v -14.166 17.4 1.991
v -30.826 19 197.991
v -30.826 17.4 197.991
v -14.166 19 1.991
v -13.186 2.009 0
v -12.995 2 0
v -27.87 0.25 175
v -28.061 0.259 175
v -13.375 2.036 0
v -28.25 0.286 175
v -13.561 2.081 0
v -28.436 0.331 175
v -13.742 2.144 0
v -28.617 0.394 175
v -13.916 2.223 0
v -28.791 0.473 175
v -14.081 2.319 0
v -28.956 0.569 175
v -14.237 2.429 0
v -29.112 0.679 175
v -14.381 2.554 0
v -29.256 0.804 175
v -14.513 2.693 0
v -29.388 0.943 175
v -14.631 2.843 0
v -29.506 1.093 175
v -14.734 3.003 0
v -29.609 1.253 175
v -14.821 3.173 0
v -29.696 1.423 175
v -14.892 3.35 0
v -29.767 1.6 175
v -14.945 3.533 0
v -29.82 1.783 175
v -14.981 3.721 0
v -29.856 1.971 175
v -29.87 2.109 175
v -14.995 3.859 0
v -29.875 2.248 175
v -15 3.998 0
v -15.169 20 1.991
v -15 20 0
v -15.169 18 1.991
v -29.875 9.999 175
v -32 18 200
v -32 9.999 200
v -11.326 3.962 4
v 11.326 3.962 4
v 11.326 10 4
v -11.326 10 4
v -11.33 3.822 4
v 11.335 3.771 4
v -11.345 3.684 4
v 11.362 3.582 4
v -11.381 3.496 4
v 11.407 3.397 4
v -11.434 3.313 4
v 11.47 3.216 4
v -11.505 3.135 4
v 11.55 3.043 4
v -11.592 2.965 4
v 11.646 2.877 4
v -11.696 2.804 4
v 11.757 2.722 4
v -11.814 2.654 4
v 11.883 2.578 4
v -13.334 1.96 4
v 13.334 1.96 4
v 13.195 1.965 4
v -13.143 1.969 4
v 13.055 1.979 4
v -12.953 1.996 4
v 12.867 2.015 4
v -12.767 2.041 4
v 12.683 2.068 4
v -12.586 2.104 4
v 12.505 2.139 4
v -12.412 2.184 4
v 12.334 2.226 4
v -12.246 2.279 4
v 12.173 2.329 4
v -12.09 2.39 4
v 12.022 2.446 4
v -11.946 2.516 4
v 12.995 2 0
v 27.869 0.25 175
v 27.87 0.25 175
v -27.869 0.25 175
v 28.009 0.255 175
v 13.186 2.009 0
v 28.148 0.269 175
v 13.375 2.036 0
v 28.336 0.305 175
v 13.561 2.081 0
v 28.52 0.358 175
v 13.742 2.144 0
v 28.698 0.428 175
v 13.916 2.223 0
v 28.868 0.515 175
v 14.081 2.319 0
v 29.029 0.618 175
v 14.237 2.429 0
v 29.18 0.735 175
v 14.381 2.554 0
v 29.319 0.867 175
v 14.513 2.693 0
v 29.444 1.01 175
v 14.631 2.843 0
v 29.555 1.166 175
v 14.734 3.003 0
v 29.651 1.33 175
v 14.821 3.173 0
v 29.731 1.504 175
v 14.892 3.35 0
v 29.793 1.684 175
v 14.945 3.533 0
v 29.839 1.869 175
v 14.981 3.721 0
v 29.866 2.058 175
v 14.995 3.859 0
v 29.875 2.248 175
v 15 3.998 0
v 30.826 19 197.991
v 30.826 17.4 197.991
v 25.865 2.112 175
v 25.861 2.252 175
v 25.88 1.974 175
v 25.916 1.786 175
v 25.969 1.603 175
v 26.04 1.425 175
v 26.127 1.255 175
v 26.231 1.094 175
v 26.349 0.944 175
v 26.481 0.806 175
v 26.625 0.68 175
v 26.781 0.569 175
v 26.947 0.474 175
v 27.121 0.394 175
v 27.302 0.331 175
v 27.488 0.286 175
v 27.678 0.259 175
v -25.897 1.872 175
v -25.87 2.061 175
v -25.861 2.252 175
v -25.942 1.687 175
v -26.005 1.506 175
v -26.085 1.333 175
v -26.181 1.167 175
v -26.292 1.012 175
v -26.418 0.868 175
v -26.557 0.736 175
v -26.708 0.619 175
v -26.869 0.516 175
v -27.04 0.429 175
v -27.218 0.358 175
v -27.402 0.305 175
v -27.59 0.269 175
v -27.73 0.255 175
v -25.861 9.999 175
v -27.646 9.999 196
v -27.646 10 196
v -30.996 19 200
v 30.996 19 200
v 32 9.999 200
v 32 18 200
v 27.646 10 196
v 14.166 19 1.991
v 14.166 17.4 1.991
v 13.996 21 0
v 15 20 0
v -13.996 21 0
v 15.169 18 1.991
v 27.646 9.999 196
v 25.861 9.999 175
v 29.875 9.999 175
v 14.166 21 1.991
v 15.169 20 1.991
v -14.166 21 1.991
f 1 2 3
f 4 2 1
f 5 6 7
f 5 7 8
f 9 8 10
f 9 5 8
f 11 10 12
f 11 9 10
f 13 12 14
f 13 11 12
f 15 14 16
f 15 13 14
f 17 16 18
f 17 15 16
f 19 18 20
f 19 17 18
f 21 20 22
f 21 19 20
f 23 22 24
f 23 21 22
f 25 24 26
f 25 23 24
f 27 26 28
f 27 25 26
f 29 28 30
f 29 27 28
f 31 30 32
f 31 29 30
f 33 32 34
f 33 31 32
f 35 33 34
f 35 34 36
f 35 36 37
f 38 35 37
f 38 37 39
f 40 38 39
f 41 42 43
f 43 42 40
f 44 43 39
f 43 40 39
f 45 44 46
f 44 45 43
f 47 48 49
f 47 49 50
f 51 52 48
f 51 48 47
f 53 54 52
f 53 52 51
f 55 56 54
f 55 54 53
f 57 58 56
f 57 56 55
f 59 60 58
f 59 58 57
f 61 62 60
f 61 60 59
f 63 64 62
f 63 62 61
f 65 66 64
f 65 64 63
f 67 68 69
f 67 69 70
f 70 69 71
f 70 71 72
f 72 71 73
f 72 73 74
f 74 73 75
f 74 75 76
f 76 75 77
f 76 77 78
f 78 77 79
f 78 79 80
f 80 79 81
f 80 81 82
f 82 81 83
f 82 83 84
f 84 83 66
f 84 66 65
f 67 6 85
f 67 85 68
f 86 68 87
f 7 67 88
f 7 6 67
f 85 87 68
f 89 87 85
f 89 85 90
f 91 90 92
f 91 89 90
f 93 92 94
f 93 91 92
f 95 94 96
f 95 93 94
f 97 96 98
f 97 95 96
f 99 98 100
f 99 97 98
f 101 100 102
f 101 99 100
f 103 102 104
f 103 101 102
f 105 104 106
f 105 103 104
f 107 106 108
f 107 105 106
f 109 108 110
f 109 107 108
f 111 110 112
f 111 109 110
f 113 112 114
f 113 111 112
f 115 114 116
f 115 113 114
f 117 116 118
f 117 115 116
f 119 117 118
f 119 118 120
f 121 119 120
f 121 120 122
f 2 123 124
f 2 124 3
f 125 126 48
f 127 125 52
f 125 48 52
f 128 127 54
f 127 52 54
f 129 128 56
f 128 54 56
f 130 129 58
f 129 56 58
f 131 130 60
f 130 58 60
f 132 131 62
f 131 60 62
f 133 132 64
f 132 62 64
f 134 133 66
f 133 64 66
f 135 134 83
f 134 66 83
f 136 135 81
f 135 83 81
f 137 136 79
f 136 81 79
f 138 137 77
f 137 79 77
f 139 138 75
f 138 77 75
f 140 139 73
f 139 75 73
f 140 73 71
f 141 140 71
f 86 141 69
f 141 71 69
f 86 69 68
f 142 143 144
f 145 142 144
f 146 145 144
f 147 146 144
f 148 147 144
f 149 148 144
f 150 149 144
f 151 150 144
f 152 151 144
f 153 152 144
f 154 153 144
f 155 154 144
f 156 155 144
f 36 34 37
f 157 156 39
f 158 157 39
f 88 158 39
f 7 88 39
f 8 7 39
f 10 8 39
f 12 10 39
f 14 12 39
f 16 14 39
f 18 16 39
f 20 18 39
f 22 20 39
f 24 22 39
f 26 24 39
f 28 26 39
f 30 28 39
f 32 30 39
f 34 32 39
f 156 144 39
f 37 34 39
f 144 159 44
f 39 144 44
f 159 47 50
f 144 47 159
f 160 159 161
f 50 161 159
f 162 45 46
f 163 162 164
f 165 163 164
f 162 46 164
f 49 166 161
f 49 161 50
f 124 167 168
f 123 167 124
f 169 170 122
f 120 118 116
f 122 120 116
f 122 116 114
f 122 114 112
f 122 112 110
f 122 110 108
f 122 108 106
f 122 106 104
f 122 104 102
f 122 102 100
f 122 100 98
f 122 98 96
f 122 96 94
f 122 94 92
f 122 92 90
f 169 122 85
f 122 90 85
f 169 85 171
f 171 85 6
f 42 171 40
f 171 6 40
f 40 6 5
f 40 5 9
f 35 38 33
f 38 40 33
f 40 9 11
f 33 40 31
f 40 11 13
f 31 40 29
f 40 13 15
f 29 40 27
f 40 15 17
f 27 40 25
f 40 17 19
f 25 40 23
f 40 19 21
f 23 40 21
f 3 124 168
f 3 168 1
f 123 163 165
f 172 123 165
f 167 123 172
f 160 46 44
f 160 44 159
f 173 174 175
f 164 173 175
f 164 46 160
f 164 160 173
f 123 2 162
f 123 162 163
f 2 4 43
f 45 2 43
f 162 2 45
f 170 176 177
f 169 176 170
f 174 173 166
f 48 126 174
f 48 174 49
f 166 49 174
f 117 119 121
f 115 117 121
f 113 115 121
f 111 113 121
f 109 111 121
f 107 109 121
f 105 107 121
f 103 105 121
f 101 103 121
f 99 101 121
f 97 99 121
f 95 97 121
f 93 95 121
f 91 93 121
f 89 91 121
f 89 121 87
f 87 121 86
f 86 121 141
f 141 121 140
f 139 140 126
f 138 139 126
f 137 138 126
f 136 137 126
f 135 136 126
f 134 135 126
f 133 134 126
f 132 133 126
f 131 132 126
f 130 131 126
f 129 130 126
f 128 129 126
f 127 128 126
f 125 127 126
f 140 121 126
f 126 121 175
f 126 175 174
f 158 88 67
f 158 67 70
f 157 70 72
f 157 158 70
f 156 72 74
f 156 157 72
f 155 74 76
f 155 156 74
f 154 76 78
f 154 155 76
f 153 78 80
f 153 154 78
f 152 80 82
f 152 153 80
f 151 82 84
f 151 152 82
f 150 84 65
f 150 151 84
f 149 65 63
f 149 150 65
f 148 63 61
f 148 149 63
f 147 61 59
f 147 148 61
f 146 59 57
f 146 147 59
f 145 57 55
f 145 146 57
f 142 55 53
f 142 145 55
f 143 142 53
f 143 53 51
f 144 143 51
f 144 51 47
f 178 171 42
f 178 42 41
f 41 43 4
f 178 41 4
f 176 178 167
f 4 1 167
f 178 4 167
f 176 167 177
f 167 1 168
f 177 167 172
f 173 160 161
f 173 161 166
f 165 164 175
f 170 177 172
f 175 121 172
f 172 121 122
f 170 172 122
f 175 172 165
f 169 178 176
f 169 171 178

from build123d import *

# Parameters (mm, degrees)
BOSS_EXTRUDE1_DEPTH      = 19
CUT_EXTRUDE1_DEPTH       = 204.4330356653019
CUT_EXTRUDE1_DEPTH_BACK  = 204.4330356653019
SHELL1_T                 = -4
SHELL1_THICKNESS_2_DEPTH = 5
FILLET2_R                = 2
FILLET3_R                = 2
BOSS_EXTRUDE2_DEPTH      = 1.9999999999999862
CHAMFER1_SIZE            = 1
CHAMFER2_SIZE            = 1
CUT_EXTRUDE2_DEPTH       = 1.6
CUT_EXTRUDE3_DEPTH       = 25.000000000000007


with BuildPart() as part:
    # Sketch1 → Boss-Extrude1 (new body)
    with BuildSketch(Plane(origin=(0, 0, 0), x_dir=(1, 0, 0), z_dir=(0, 1, 0))):
        Polygon((15, 1.84e-15), (-15, -1.84e-15), (-31.99999999999997, -200), (32.00000000000003, -200), align=None)
    extrude(amount=BOSS_EXTRUDE1_DEPTH)

    # Sketch4 → Cut-Extrude1 (cut, two sides: drawn at the far end of the back side and taken through both)
    with BuildSketch(Plane(origin=(0, 0, 0), x_dir=(0, 0, -1), z_dir=(1, 0, 0)).offset(-CUT_EXTRUDE1_DEPTH_BACK)):
        Polygon((-200, 0), (0, 0), (1.59e-15, 2), align=None)
    extrude(amount=CUT_EXTRUDE1_DEPTH + CUT_EXTRUDE1_DEPTH_BACK, mode=Mode.SUBTRACT)

    # Shell1
    shell1_openings = [part.faces().sort_by_distance(p)[0] for p in [
        (0, 0.879432624, 112.056737589),
    ]]
    offset(amount=SHELL1_T, openings=shell1_openings, kind=Kind.INTERSECTION)

    # Shell1 thickness 2 face (on inner face of the shell) → Shell1 thickness 2 (add)
    with BuildSketch(Plane(origin=(0, 15, 113.400681607), x_dir=(0, 0, 1), z_dir=(0, 1, 0))):
        Polygon((-109.400681607, 11.325576006448747), (82.599318393, 27.645576006448778), (82.599318393, -27.645576006448714), (-109.400681607, -11.325576006448745), align=None)
    extrude(amount=-SHELL1_THICKNESS_2_DEPTH)

    # Fillet2
    fillet2_edges = [part.edges().sort_by_distance(p)[0] for p in [
        (23.500000000000014, 0.9999999999999999, 100.00000000000001),
        (19.485576006448763, 1.0000000000000002, 100),
    ]]
    fillet(fillet2_edges, radius=FILLET2_R - 0.0001)  # a hair under: the kernel refuses the full size

    # Fillet3
    fillet3_edges = [part.edges().sort_by_distance(p)[0] for p in [
        (-23.499999999999986, 1, 100),
        (-19.48557600644873, 0.9999999999999998, 100),
    ]]
    fillet(fillet3_edges, radius=FILLET3_R - 0.0001)  # a hair under: the kernel refuses the full size

    # Sketch5 → Boss-Extrude2 (add)
    with BuildSketch(Plane(origin=(0, 19, 0), x_dir=(1, 0, 0), z_dir=(0, 1, 0))):
        Polygon((-15, -1.84e-15), (-15.169255888521393, -1.9912457473105094), (15.169255888521398, -1.9912457473105094), (15, 1.84e-15), align=None)
    extrude(amount=BOSS_EXTRUDE2_DEPTH)

    # Chamfer1
    chamfer1_edges = [part.edges().sort_by_distance(p)[0] for p in [
        (23.58462794426071, 19, 100.99562287365525),
        (-23.58462794426068, 19, 100.99562287365526),
    ]]
    chamfer(chamfer1_edges, length=CHAMFER1_SIZE)

    # Chamfer2
    chamfer2_edges = [part.edges().sort_by_distance(p)[0] for p in [
        (-15.084627944260696, 20.999999999999986, 0.9956228736552557),
        (15.0846279442607, 20.999999999999986, 0.9956228736552538),
    ]]
    chamfer(chamfer2_edges, length=CHAMFER2_SIZE)

    # Sketch6 → Cut-Extrude2 (cut)
    with BuildSketch(Plane(origin=(0, 19, 0), x_dir=(1, 0, 0), z_dir=(0, 1, 0))):
        Polygon((-14.165649890133558, -1.9912457473105094), (14.16564989013358, -1.9912457473105079), (30.825649890133608, -197.99124574731053), (-30.825649890133526, -197.99124574731053), align=None)
    extrude(amount=-CUT_EXTRUDE2_DEPTH, mode=Mode.SUBTRACT)

    # Sketch7 → Cut-Extrude3 (cut)
    with BuildSketch(Plane.XY.offset(200)):
        Polygon((-31.99999999999997, 9.99920305283565), (32.00000000000003, 9.999203052835664), (32.00000000000003, 0), (-31.99999999999997, 0), align=None)
    extrude(amount=-CUT_EXTRUDE3_DEPTH, mode=Mode.SUBTRACT)


solid = part.part
